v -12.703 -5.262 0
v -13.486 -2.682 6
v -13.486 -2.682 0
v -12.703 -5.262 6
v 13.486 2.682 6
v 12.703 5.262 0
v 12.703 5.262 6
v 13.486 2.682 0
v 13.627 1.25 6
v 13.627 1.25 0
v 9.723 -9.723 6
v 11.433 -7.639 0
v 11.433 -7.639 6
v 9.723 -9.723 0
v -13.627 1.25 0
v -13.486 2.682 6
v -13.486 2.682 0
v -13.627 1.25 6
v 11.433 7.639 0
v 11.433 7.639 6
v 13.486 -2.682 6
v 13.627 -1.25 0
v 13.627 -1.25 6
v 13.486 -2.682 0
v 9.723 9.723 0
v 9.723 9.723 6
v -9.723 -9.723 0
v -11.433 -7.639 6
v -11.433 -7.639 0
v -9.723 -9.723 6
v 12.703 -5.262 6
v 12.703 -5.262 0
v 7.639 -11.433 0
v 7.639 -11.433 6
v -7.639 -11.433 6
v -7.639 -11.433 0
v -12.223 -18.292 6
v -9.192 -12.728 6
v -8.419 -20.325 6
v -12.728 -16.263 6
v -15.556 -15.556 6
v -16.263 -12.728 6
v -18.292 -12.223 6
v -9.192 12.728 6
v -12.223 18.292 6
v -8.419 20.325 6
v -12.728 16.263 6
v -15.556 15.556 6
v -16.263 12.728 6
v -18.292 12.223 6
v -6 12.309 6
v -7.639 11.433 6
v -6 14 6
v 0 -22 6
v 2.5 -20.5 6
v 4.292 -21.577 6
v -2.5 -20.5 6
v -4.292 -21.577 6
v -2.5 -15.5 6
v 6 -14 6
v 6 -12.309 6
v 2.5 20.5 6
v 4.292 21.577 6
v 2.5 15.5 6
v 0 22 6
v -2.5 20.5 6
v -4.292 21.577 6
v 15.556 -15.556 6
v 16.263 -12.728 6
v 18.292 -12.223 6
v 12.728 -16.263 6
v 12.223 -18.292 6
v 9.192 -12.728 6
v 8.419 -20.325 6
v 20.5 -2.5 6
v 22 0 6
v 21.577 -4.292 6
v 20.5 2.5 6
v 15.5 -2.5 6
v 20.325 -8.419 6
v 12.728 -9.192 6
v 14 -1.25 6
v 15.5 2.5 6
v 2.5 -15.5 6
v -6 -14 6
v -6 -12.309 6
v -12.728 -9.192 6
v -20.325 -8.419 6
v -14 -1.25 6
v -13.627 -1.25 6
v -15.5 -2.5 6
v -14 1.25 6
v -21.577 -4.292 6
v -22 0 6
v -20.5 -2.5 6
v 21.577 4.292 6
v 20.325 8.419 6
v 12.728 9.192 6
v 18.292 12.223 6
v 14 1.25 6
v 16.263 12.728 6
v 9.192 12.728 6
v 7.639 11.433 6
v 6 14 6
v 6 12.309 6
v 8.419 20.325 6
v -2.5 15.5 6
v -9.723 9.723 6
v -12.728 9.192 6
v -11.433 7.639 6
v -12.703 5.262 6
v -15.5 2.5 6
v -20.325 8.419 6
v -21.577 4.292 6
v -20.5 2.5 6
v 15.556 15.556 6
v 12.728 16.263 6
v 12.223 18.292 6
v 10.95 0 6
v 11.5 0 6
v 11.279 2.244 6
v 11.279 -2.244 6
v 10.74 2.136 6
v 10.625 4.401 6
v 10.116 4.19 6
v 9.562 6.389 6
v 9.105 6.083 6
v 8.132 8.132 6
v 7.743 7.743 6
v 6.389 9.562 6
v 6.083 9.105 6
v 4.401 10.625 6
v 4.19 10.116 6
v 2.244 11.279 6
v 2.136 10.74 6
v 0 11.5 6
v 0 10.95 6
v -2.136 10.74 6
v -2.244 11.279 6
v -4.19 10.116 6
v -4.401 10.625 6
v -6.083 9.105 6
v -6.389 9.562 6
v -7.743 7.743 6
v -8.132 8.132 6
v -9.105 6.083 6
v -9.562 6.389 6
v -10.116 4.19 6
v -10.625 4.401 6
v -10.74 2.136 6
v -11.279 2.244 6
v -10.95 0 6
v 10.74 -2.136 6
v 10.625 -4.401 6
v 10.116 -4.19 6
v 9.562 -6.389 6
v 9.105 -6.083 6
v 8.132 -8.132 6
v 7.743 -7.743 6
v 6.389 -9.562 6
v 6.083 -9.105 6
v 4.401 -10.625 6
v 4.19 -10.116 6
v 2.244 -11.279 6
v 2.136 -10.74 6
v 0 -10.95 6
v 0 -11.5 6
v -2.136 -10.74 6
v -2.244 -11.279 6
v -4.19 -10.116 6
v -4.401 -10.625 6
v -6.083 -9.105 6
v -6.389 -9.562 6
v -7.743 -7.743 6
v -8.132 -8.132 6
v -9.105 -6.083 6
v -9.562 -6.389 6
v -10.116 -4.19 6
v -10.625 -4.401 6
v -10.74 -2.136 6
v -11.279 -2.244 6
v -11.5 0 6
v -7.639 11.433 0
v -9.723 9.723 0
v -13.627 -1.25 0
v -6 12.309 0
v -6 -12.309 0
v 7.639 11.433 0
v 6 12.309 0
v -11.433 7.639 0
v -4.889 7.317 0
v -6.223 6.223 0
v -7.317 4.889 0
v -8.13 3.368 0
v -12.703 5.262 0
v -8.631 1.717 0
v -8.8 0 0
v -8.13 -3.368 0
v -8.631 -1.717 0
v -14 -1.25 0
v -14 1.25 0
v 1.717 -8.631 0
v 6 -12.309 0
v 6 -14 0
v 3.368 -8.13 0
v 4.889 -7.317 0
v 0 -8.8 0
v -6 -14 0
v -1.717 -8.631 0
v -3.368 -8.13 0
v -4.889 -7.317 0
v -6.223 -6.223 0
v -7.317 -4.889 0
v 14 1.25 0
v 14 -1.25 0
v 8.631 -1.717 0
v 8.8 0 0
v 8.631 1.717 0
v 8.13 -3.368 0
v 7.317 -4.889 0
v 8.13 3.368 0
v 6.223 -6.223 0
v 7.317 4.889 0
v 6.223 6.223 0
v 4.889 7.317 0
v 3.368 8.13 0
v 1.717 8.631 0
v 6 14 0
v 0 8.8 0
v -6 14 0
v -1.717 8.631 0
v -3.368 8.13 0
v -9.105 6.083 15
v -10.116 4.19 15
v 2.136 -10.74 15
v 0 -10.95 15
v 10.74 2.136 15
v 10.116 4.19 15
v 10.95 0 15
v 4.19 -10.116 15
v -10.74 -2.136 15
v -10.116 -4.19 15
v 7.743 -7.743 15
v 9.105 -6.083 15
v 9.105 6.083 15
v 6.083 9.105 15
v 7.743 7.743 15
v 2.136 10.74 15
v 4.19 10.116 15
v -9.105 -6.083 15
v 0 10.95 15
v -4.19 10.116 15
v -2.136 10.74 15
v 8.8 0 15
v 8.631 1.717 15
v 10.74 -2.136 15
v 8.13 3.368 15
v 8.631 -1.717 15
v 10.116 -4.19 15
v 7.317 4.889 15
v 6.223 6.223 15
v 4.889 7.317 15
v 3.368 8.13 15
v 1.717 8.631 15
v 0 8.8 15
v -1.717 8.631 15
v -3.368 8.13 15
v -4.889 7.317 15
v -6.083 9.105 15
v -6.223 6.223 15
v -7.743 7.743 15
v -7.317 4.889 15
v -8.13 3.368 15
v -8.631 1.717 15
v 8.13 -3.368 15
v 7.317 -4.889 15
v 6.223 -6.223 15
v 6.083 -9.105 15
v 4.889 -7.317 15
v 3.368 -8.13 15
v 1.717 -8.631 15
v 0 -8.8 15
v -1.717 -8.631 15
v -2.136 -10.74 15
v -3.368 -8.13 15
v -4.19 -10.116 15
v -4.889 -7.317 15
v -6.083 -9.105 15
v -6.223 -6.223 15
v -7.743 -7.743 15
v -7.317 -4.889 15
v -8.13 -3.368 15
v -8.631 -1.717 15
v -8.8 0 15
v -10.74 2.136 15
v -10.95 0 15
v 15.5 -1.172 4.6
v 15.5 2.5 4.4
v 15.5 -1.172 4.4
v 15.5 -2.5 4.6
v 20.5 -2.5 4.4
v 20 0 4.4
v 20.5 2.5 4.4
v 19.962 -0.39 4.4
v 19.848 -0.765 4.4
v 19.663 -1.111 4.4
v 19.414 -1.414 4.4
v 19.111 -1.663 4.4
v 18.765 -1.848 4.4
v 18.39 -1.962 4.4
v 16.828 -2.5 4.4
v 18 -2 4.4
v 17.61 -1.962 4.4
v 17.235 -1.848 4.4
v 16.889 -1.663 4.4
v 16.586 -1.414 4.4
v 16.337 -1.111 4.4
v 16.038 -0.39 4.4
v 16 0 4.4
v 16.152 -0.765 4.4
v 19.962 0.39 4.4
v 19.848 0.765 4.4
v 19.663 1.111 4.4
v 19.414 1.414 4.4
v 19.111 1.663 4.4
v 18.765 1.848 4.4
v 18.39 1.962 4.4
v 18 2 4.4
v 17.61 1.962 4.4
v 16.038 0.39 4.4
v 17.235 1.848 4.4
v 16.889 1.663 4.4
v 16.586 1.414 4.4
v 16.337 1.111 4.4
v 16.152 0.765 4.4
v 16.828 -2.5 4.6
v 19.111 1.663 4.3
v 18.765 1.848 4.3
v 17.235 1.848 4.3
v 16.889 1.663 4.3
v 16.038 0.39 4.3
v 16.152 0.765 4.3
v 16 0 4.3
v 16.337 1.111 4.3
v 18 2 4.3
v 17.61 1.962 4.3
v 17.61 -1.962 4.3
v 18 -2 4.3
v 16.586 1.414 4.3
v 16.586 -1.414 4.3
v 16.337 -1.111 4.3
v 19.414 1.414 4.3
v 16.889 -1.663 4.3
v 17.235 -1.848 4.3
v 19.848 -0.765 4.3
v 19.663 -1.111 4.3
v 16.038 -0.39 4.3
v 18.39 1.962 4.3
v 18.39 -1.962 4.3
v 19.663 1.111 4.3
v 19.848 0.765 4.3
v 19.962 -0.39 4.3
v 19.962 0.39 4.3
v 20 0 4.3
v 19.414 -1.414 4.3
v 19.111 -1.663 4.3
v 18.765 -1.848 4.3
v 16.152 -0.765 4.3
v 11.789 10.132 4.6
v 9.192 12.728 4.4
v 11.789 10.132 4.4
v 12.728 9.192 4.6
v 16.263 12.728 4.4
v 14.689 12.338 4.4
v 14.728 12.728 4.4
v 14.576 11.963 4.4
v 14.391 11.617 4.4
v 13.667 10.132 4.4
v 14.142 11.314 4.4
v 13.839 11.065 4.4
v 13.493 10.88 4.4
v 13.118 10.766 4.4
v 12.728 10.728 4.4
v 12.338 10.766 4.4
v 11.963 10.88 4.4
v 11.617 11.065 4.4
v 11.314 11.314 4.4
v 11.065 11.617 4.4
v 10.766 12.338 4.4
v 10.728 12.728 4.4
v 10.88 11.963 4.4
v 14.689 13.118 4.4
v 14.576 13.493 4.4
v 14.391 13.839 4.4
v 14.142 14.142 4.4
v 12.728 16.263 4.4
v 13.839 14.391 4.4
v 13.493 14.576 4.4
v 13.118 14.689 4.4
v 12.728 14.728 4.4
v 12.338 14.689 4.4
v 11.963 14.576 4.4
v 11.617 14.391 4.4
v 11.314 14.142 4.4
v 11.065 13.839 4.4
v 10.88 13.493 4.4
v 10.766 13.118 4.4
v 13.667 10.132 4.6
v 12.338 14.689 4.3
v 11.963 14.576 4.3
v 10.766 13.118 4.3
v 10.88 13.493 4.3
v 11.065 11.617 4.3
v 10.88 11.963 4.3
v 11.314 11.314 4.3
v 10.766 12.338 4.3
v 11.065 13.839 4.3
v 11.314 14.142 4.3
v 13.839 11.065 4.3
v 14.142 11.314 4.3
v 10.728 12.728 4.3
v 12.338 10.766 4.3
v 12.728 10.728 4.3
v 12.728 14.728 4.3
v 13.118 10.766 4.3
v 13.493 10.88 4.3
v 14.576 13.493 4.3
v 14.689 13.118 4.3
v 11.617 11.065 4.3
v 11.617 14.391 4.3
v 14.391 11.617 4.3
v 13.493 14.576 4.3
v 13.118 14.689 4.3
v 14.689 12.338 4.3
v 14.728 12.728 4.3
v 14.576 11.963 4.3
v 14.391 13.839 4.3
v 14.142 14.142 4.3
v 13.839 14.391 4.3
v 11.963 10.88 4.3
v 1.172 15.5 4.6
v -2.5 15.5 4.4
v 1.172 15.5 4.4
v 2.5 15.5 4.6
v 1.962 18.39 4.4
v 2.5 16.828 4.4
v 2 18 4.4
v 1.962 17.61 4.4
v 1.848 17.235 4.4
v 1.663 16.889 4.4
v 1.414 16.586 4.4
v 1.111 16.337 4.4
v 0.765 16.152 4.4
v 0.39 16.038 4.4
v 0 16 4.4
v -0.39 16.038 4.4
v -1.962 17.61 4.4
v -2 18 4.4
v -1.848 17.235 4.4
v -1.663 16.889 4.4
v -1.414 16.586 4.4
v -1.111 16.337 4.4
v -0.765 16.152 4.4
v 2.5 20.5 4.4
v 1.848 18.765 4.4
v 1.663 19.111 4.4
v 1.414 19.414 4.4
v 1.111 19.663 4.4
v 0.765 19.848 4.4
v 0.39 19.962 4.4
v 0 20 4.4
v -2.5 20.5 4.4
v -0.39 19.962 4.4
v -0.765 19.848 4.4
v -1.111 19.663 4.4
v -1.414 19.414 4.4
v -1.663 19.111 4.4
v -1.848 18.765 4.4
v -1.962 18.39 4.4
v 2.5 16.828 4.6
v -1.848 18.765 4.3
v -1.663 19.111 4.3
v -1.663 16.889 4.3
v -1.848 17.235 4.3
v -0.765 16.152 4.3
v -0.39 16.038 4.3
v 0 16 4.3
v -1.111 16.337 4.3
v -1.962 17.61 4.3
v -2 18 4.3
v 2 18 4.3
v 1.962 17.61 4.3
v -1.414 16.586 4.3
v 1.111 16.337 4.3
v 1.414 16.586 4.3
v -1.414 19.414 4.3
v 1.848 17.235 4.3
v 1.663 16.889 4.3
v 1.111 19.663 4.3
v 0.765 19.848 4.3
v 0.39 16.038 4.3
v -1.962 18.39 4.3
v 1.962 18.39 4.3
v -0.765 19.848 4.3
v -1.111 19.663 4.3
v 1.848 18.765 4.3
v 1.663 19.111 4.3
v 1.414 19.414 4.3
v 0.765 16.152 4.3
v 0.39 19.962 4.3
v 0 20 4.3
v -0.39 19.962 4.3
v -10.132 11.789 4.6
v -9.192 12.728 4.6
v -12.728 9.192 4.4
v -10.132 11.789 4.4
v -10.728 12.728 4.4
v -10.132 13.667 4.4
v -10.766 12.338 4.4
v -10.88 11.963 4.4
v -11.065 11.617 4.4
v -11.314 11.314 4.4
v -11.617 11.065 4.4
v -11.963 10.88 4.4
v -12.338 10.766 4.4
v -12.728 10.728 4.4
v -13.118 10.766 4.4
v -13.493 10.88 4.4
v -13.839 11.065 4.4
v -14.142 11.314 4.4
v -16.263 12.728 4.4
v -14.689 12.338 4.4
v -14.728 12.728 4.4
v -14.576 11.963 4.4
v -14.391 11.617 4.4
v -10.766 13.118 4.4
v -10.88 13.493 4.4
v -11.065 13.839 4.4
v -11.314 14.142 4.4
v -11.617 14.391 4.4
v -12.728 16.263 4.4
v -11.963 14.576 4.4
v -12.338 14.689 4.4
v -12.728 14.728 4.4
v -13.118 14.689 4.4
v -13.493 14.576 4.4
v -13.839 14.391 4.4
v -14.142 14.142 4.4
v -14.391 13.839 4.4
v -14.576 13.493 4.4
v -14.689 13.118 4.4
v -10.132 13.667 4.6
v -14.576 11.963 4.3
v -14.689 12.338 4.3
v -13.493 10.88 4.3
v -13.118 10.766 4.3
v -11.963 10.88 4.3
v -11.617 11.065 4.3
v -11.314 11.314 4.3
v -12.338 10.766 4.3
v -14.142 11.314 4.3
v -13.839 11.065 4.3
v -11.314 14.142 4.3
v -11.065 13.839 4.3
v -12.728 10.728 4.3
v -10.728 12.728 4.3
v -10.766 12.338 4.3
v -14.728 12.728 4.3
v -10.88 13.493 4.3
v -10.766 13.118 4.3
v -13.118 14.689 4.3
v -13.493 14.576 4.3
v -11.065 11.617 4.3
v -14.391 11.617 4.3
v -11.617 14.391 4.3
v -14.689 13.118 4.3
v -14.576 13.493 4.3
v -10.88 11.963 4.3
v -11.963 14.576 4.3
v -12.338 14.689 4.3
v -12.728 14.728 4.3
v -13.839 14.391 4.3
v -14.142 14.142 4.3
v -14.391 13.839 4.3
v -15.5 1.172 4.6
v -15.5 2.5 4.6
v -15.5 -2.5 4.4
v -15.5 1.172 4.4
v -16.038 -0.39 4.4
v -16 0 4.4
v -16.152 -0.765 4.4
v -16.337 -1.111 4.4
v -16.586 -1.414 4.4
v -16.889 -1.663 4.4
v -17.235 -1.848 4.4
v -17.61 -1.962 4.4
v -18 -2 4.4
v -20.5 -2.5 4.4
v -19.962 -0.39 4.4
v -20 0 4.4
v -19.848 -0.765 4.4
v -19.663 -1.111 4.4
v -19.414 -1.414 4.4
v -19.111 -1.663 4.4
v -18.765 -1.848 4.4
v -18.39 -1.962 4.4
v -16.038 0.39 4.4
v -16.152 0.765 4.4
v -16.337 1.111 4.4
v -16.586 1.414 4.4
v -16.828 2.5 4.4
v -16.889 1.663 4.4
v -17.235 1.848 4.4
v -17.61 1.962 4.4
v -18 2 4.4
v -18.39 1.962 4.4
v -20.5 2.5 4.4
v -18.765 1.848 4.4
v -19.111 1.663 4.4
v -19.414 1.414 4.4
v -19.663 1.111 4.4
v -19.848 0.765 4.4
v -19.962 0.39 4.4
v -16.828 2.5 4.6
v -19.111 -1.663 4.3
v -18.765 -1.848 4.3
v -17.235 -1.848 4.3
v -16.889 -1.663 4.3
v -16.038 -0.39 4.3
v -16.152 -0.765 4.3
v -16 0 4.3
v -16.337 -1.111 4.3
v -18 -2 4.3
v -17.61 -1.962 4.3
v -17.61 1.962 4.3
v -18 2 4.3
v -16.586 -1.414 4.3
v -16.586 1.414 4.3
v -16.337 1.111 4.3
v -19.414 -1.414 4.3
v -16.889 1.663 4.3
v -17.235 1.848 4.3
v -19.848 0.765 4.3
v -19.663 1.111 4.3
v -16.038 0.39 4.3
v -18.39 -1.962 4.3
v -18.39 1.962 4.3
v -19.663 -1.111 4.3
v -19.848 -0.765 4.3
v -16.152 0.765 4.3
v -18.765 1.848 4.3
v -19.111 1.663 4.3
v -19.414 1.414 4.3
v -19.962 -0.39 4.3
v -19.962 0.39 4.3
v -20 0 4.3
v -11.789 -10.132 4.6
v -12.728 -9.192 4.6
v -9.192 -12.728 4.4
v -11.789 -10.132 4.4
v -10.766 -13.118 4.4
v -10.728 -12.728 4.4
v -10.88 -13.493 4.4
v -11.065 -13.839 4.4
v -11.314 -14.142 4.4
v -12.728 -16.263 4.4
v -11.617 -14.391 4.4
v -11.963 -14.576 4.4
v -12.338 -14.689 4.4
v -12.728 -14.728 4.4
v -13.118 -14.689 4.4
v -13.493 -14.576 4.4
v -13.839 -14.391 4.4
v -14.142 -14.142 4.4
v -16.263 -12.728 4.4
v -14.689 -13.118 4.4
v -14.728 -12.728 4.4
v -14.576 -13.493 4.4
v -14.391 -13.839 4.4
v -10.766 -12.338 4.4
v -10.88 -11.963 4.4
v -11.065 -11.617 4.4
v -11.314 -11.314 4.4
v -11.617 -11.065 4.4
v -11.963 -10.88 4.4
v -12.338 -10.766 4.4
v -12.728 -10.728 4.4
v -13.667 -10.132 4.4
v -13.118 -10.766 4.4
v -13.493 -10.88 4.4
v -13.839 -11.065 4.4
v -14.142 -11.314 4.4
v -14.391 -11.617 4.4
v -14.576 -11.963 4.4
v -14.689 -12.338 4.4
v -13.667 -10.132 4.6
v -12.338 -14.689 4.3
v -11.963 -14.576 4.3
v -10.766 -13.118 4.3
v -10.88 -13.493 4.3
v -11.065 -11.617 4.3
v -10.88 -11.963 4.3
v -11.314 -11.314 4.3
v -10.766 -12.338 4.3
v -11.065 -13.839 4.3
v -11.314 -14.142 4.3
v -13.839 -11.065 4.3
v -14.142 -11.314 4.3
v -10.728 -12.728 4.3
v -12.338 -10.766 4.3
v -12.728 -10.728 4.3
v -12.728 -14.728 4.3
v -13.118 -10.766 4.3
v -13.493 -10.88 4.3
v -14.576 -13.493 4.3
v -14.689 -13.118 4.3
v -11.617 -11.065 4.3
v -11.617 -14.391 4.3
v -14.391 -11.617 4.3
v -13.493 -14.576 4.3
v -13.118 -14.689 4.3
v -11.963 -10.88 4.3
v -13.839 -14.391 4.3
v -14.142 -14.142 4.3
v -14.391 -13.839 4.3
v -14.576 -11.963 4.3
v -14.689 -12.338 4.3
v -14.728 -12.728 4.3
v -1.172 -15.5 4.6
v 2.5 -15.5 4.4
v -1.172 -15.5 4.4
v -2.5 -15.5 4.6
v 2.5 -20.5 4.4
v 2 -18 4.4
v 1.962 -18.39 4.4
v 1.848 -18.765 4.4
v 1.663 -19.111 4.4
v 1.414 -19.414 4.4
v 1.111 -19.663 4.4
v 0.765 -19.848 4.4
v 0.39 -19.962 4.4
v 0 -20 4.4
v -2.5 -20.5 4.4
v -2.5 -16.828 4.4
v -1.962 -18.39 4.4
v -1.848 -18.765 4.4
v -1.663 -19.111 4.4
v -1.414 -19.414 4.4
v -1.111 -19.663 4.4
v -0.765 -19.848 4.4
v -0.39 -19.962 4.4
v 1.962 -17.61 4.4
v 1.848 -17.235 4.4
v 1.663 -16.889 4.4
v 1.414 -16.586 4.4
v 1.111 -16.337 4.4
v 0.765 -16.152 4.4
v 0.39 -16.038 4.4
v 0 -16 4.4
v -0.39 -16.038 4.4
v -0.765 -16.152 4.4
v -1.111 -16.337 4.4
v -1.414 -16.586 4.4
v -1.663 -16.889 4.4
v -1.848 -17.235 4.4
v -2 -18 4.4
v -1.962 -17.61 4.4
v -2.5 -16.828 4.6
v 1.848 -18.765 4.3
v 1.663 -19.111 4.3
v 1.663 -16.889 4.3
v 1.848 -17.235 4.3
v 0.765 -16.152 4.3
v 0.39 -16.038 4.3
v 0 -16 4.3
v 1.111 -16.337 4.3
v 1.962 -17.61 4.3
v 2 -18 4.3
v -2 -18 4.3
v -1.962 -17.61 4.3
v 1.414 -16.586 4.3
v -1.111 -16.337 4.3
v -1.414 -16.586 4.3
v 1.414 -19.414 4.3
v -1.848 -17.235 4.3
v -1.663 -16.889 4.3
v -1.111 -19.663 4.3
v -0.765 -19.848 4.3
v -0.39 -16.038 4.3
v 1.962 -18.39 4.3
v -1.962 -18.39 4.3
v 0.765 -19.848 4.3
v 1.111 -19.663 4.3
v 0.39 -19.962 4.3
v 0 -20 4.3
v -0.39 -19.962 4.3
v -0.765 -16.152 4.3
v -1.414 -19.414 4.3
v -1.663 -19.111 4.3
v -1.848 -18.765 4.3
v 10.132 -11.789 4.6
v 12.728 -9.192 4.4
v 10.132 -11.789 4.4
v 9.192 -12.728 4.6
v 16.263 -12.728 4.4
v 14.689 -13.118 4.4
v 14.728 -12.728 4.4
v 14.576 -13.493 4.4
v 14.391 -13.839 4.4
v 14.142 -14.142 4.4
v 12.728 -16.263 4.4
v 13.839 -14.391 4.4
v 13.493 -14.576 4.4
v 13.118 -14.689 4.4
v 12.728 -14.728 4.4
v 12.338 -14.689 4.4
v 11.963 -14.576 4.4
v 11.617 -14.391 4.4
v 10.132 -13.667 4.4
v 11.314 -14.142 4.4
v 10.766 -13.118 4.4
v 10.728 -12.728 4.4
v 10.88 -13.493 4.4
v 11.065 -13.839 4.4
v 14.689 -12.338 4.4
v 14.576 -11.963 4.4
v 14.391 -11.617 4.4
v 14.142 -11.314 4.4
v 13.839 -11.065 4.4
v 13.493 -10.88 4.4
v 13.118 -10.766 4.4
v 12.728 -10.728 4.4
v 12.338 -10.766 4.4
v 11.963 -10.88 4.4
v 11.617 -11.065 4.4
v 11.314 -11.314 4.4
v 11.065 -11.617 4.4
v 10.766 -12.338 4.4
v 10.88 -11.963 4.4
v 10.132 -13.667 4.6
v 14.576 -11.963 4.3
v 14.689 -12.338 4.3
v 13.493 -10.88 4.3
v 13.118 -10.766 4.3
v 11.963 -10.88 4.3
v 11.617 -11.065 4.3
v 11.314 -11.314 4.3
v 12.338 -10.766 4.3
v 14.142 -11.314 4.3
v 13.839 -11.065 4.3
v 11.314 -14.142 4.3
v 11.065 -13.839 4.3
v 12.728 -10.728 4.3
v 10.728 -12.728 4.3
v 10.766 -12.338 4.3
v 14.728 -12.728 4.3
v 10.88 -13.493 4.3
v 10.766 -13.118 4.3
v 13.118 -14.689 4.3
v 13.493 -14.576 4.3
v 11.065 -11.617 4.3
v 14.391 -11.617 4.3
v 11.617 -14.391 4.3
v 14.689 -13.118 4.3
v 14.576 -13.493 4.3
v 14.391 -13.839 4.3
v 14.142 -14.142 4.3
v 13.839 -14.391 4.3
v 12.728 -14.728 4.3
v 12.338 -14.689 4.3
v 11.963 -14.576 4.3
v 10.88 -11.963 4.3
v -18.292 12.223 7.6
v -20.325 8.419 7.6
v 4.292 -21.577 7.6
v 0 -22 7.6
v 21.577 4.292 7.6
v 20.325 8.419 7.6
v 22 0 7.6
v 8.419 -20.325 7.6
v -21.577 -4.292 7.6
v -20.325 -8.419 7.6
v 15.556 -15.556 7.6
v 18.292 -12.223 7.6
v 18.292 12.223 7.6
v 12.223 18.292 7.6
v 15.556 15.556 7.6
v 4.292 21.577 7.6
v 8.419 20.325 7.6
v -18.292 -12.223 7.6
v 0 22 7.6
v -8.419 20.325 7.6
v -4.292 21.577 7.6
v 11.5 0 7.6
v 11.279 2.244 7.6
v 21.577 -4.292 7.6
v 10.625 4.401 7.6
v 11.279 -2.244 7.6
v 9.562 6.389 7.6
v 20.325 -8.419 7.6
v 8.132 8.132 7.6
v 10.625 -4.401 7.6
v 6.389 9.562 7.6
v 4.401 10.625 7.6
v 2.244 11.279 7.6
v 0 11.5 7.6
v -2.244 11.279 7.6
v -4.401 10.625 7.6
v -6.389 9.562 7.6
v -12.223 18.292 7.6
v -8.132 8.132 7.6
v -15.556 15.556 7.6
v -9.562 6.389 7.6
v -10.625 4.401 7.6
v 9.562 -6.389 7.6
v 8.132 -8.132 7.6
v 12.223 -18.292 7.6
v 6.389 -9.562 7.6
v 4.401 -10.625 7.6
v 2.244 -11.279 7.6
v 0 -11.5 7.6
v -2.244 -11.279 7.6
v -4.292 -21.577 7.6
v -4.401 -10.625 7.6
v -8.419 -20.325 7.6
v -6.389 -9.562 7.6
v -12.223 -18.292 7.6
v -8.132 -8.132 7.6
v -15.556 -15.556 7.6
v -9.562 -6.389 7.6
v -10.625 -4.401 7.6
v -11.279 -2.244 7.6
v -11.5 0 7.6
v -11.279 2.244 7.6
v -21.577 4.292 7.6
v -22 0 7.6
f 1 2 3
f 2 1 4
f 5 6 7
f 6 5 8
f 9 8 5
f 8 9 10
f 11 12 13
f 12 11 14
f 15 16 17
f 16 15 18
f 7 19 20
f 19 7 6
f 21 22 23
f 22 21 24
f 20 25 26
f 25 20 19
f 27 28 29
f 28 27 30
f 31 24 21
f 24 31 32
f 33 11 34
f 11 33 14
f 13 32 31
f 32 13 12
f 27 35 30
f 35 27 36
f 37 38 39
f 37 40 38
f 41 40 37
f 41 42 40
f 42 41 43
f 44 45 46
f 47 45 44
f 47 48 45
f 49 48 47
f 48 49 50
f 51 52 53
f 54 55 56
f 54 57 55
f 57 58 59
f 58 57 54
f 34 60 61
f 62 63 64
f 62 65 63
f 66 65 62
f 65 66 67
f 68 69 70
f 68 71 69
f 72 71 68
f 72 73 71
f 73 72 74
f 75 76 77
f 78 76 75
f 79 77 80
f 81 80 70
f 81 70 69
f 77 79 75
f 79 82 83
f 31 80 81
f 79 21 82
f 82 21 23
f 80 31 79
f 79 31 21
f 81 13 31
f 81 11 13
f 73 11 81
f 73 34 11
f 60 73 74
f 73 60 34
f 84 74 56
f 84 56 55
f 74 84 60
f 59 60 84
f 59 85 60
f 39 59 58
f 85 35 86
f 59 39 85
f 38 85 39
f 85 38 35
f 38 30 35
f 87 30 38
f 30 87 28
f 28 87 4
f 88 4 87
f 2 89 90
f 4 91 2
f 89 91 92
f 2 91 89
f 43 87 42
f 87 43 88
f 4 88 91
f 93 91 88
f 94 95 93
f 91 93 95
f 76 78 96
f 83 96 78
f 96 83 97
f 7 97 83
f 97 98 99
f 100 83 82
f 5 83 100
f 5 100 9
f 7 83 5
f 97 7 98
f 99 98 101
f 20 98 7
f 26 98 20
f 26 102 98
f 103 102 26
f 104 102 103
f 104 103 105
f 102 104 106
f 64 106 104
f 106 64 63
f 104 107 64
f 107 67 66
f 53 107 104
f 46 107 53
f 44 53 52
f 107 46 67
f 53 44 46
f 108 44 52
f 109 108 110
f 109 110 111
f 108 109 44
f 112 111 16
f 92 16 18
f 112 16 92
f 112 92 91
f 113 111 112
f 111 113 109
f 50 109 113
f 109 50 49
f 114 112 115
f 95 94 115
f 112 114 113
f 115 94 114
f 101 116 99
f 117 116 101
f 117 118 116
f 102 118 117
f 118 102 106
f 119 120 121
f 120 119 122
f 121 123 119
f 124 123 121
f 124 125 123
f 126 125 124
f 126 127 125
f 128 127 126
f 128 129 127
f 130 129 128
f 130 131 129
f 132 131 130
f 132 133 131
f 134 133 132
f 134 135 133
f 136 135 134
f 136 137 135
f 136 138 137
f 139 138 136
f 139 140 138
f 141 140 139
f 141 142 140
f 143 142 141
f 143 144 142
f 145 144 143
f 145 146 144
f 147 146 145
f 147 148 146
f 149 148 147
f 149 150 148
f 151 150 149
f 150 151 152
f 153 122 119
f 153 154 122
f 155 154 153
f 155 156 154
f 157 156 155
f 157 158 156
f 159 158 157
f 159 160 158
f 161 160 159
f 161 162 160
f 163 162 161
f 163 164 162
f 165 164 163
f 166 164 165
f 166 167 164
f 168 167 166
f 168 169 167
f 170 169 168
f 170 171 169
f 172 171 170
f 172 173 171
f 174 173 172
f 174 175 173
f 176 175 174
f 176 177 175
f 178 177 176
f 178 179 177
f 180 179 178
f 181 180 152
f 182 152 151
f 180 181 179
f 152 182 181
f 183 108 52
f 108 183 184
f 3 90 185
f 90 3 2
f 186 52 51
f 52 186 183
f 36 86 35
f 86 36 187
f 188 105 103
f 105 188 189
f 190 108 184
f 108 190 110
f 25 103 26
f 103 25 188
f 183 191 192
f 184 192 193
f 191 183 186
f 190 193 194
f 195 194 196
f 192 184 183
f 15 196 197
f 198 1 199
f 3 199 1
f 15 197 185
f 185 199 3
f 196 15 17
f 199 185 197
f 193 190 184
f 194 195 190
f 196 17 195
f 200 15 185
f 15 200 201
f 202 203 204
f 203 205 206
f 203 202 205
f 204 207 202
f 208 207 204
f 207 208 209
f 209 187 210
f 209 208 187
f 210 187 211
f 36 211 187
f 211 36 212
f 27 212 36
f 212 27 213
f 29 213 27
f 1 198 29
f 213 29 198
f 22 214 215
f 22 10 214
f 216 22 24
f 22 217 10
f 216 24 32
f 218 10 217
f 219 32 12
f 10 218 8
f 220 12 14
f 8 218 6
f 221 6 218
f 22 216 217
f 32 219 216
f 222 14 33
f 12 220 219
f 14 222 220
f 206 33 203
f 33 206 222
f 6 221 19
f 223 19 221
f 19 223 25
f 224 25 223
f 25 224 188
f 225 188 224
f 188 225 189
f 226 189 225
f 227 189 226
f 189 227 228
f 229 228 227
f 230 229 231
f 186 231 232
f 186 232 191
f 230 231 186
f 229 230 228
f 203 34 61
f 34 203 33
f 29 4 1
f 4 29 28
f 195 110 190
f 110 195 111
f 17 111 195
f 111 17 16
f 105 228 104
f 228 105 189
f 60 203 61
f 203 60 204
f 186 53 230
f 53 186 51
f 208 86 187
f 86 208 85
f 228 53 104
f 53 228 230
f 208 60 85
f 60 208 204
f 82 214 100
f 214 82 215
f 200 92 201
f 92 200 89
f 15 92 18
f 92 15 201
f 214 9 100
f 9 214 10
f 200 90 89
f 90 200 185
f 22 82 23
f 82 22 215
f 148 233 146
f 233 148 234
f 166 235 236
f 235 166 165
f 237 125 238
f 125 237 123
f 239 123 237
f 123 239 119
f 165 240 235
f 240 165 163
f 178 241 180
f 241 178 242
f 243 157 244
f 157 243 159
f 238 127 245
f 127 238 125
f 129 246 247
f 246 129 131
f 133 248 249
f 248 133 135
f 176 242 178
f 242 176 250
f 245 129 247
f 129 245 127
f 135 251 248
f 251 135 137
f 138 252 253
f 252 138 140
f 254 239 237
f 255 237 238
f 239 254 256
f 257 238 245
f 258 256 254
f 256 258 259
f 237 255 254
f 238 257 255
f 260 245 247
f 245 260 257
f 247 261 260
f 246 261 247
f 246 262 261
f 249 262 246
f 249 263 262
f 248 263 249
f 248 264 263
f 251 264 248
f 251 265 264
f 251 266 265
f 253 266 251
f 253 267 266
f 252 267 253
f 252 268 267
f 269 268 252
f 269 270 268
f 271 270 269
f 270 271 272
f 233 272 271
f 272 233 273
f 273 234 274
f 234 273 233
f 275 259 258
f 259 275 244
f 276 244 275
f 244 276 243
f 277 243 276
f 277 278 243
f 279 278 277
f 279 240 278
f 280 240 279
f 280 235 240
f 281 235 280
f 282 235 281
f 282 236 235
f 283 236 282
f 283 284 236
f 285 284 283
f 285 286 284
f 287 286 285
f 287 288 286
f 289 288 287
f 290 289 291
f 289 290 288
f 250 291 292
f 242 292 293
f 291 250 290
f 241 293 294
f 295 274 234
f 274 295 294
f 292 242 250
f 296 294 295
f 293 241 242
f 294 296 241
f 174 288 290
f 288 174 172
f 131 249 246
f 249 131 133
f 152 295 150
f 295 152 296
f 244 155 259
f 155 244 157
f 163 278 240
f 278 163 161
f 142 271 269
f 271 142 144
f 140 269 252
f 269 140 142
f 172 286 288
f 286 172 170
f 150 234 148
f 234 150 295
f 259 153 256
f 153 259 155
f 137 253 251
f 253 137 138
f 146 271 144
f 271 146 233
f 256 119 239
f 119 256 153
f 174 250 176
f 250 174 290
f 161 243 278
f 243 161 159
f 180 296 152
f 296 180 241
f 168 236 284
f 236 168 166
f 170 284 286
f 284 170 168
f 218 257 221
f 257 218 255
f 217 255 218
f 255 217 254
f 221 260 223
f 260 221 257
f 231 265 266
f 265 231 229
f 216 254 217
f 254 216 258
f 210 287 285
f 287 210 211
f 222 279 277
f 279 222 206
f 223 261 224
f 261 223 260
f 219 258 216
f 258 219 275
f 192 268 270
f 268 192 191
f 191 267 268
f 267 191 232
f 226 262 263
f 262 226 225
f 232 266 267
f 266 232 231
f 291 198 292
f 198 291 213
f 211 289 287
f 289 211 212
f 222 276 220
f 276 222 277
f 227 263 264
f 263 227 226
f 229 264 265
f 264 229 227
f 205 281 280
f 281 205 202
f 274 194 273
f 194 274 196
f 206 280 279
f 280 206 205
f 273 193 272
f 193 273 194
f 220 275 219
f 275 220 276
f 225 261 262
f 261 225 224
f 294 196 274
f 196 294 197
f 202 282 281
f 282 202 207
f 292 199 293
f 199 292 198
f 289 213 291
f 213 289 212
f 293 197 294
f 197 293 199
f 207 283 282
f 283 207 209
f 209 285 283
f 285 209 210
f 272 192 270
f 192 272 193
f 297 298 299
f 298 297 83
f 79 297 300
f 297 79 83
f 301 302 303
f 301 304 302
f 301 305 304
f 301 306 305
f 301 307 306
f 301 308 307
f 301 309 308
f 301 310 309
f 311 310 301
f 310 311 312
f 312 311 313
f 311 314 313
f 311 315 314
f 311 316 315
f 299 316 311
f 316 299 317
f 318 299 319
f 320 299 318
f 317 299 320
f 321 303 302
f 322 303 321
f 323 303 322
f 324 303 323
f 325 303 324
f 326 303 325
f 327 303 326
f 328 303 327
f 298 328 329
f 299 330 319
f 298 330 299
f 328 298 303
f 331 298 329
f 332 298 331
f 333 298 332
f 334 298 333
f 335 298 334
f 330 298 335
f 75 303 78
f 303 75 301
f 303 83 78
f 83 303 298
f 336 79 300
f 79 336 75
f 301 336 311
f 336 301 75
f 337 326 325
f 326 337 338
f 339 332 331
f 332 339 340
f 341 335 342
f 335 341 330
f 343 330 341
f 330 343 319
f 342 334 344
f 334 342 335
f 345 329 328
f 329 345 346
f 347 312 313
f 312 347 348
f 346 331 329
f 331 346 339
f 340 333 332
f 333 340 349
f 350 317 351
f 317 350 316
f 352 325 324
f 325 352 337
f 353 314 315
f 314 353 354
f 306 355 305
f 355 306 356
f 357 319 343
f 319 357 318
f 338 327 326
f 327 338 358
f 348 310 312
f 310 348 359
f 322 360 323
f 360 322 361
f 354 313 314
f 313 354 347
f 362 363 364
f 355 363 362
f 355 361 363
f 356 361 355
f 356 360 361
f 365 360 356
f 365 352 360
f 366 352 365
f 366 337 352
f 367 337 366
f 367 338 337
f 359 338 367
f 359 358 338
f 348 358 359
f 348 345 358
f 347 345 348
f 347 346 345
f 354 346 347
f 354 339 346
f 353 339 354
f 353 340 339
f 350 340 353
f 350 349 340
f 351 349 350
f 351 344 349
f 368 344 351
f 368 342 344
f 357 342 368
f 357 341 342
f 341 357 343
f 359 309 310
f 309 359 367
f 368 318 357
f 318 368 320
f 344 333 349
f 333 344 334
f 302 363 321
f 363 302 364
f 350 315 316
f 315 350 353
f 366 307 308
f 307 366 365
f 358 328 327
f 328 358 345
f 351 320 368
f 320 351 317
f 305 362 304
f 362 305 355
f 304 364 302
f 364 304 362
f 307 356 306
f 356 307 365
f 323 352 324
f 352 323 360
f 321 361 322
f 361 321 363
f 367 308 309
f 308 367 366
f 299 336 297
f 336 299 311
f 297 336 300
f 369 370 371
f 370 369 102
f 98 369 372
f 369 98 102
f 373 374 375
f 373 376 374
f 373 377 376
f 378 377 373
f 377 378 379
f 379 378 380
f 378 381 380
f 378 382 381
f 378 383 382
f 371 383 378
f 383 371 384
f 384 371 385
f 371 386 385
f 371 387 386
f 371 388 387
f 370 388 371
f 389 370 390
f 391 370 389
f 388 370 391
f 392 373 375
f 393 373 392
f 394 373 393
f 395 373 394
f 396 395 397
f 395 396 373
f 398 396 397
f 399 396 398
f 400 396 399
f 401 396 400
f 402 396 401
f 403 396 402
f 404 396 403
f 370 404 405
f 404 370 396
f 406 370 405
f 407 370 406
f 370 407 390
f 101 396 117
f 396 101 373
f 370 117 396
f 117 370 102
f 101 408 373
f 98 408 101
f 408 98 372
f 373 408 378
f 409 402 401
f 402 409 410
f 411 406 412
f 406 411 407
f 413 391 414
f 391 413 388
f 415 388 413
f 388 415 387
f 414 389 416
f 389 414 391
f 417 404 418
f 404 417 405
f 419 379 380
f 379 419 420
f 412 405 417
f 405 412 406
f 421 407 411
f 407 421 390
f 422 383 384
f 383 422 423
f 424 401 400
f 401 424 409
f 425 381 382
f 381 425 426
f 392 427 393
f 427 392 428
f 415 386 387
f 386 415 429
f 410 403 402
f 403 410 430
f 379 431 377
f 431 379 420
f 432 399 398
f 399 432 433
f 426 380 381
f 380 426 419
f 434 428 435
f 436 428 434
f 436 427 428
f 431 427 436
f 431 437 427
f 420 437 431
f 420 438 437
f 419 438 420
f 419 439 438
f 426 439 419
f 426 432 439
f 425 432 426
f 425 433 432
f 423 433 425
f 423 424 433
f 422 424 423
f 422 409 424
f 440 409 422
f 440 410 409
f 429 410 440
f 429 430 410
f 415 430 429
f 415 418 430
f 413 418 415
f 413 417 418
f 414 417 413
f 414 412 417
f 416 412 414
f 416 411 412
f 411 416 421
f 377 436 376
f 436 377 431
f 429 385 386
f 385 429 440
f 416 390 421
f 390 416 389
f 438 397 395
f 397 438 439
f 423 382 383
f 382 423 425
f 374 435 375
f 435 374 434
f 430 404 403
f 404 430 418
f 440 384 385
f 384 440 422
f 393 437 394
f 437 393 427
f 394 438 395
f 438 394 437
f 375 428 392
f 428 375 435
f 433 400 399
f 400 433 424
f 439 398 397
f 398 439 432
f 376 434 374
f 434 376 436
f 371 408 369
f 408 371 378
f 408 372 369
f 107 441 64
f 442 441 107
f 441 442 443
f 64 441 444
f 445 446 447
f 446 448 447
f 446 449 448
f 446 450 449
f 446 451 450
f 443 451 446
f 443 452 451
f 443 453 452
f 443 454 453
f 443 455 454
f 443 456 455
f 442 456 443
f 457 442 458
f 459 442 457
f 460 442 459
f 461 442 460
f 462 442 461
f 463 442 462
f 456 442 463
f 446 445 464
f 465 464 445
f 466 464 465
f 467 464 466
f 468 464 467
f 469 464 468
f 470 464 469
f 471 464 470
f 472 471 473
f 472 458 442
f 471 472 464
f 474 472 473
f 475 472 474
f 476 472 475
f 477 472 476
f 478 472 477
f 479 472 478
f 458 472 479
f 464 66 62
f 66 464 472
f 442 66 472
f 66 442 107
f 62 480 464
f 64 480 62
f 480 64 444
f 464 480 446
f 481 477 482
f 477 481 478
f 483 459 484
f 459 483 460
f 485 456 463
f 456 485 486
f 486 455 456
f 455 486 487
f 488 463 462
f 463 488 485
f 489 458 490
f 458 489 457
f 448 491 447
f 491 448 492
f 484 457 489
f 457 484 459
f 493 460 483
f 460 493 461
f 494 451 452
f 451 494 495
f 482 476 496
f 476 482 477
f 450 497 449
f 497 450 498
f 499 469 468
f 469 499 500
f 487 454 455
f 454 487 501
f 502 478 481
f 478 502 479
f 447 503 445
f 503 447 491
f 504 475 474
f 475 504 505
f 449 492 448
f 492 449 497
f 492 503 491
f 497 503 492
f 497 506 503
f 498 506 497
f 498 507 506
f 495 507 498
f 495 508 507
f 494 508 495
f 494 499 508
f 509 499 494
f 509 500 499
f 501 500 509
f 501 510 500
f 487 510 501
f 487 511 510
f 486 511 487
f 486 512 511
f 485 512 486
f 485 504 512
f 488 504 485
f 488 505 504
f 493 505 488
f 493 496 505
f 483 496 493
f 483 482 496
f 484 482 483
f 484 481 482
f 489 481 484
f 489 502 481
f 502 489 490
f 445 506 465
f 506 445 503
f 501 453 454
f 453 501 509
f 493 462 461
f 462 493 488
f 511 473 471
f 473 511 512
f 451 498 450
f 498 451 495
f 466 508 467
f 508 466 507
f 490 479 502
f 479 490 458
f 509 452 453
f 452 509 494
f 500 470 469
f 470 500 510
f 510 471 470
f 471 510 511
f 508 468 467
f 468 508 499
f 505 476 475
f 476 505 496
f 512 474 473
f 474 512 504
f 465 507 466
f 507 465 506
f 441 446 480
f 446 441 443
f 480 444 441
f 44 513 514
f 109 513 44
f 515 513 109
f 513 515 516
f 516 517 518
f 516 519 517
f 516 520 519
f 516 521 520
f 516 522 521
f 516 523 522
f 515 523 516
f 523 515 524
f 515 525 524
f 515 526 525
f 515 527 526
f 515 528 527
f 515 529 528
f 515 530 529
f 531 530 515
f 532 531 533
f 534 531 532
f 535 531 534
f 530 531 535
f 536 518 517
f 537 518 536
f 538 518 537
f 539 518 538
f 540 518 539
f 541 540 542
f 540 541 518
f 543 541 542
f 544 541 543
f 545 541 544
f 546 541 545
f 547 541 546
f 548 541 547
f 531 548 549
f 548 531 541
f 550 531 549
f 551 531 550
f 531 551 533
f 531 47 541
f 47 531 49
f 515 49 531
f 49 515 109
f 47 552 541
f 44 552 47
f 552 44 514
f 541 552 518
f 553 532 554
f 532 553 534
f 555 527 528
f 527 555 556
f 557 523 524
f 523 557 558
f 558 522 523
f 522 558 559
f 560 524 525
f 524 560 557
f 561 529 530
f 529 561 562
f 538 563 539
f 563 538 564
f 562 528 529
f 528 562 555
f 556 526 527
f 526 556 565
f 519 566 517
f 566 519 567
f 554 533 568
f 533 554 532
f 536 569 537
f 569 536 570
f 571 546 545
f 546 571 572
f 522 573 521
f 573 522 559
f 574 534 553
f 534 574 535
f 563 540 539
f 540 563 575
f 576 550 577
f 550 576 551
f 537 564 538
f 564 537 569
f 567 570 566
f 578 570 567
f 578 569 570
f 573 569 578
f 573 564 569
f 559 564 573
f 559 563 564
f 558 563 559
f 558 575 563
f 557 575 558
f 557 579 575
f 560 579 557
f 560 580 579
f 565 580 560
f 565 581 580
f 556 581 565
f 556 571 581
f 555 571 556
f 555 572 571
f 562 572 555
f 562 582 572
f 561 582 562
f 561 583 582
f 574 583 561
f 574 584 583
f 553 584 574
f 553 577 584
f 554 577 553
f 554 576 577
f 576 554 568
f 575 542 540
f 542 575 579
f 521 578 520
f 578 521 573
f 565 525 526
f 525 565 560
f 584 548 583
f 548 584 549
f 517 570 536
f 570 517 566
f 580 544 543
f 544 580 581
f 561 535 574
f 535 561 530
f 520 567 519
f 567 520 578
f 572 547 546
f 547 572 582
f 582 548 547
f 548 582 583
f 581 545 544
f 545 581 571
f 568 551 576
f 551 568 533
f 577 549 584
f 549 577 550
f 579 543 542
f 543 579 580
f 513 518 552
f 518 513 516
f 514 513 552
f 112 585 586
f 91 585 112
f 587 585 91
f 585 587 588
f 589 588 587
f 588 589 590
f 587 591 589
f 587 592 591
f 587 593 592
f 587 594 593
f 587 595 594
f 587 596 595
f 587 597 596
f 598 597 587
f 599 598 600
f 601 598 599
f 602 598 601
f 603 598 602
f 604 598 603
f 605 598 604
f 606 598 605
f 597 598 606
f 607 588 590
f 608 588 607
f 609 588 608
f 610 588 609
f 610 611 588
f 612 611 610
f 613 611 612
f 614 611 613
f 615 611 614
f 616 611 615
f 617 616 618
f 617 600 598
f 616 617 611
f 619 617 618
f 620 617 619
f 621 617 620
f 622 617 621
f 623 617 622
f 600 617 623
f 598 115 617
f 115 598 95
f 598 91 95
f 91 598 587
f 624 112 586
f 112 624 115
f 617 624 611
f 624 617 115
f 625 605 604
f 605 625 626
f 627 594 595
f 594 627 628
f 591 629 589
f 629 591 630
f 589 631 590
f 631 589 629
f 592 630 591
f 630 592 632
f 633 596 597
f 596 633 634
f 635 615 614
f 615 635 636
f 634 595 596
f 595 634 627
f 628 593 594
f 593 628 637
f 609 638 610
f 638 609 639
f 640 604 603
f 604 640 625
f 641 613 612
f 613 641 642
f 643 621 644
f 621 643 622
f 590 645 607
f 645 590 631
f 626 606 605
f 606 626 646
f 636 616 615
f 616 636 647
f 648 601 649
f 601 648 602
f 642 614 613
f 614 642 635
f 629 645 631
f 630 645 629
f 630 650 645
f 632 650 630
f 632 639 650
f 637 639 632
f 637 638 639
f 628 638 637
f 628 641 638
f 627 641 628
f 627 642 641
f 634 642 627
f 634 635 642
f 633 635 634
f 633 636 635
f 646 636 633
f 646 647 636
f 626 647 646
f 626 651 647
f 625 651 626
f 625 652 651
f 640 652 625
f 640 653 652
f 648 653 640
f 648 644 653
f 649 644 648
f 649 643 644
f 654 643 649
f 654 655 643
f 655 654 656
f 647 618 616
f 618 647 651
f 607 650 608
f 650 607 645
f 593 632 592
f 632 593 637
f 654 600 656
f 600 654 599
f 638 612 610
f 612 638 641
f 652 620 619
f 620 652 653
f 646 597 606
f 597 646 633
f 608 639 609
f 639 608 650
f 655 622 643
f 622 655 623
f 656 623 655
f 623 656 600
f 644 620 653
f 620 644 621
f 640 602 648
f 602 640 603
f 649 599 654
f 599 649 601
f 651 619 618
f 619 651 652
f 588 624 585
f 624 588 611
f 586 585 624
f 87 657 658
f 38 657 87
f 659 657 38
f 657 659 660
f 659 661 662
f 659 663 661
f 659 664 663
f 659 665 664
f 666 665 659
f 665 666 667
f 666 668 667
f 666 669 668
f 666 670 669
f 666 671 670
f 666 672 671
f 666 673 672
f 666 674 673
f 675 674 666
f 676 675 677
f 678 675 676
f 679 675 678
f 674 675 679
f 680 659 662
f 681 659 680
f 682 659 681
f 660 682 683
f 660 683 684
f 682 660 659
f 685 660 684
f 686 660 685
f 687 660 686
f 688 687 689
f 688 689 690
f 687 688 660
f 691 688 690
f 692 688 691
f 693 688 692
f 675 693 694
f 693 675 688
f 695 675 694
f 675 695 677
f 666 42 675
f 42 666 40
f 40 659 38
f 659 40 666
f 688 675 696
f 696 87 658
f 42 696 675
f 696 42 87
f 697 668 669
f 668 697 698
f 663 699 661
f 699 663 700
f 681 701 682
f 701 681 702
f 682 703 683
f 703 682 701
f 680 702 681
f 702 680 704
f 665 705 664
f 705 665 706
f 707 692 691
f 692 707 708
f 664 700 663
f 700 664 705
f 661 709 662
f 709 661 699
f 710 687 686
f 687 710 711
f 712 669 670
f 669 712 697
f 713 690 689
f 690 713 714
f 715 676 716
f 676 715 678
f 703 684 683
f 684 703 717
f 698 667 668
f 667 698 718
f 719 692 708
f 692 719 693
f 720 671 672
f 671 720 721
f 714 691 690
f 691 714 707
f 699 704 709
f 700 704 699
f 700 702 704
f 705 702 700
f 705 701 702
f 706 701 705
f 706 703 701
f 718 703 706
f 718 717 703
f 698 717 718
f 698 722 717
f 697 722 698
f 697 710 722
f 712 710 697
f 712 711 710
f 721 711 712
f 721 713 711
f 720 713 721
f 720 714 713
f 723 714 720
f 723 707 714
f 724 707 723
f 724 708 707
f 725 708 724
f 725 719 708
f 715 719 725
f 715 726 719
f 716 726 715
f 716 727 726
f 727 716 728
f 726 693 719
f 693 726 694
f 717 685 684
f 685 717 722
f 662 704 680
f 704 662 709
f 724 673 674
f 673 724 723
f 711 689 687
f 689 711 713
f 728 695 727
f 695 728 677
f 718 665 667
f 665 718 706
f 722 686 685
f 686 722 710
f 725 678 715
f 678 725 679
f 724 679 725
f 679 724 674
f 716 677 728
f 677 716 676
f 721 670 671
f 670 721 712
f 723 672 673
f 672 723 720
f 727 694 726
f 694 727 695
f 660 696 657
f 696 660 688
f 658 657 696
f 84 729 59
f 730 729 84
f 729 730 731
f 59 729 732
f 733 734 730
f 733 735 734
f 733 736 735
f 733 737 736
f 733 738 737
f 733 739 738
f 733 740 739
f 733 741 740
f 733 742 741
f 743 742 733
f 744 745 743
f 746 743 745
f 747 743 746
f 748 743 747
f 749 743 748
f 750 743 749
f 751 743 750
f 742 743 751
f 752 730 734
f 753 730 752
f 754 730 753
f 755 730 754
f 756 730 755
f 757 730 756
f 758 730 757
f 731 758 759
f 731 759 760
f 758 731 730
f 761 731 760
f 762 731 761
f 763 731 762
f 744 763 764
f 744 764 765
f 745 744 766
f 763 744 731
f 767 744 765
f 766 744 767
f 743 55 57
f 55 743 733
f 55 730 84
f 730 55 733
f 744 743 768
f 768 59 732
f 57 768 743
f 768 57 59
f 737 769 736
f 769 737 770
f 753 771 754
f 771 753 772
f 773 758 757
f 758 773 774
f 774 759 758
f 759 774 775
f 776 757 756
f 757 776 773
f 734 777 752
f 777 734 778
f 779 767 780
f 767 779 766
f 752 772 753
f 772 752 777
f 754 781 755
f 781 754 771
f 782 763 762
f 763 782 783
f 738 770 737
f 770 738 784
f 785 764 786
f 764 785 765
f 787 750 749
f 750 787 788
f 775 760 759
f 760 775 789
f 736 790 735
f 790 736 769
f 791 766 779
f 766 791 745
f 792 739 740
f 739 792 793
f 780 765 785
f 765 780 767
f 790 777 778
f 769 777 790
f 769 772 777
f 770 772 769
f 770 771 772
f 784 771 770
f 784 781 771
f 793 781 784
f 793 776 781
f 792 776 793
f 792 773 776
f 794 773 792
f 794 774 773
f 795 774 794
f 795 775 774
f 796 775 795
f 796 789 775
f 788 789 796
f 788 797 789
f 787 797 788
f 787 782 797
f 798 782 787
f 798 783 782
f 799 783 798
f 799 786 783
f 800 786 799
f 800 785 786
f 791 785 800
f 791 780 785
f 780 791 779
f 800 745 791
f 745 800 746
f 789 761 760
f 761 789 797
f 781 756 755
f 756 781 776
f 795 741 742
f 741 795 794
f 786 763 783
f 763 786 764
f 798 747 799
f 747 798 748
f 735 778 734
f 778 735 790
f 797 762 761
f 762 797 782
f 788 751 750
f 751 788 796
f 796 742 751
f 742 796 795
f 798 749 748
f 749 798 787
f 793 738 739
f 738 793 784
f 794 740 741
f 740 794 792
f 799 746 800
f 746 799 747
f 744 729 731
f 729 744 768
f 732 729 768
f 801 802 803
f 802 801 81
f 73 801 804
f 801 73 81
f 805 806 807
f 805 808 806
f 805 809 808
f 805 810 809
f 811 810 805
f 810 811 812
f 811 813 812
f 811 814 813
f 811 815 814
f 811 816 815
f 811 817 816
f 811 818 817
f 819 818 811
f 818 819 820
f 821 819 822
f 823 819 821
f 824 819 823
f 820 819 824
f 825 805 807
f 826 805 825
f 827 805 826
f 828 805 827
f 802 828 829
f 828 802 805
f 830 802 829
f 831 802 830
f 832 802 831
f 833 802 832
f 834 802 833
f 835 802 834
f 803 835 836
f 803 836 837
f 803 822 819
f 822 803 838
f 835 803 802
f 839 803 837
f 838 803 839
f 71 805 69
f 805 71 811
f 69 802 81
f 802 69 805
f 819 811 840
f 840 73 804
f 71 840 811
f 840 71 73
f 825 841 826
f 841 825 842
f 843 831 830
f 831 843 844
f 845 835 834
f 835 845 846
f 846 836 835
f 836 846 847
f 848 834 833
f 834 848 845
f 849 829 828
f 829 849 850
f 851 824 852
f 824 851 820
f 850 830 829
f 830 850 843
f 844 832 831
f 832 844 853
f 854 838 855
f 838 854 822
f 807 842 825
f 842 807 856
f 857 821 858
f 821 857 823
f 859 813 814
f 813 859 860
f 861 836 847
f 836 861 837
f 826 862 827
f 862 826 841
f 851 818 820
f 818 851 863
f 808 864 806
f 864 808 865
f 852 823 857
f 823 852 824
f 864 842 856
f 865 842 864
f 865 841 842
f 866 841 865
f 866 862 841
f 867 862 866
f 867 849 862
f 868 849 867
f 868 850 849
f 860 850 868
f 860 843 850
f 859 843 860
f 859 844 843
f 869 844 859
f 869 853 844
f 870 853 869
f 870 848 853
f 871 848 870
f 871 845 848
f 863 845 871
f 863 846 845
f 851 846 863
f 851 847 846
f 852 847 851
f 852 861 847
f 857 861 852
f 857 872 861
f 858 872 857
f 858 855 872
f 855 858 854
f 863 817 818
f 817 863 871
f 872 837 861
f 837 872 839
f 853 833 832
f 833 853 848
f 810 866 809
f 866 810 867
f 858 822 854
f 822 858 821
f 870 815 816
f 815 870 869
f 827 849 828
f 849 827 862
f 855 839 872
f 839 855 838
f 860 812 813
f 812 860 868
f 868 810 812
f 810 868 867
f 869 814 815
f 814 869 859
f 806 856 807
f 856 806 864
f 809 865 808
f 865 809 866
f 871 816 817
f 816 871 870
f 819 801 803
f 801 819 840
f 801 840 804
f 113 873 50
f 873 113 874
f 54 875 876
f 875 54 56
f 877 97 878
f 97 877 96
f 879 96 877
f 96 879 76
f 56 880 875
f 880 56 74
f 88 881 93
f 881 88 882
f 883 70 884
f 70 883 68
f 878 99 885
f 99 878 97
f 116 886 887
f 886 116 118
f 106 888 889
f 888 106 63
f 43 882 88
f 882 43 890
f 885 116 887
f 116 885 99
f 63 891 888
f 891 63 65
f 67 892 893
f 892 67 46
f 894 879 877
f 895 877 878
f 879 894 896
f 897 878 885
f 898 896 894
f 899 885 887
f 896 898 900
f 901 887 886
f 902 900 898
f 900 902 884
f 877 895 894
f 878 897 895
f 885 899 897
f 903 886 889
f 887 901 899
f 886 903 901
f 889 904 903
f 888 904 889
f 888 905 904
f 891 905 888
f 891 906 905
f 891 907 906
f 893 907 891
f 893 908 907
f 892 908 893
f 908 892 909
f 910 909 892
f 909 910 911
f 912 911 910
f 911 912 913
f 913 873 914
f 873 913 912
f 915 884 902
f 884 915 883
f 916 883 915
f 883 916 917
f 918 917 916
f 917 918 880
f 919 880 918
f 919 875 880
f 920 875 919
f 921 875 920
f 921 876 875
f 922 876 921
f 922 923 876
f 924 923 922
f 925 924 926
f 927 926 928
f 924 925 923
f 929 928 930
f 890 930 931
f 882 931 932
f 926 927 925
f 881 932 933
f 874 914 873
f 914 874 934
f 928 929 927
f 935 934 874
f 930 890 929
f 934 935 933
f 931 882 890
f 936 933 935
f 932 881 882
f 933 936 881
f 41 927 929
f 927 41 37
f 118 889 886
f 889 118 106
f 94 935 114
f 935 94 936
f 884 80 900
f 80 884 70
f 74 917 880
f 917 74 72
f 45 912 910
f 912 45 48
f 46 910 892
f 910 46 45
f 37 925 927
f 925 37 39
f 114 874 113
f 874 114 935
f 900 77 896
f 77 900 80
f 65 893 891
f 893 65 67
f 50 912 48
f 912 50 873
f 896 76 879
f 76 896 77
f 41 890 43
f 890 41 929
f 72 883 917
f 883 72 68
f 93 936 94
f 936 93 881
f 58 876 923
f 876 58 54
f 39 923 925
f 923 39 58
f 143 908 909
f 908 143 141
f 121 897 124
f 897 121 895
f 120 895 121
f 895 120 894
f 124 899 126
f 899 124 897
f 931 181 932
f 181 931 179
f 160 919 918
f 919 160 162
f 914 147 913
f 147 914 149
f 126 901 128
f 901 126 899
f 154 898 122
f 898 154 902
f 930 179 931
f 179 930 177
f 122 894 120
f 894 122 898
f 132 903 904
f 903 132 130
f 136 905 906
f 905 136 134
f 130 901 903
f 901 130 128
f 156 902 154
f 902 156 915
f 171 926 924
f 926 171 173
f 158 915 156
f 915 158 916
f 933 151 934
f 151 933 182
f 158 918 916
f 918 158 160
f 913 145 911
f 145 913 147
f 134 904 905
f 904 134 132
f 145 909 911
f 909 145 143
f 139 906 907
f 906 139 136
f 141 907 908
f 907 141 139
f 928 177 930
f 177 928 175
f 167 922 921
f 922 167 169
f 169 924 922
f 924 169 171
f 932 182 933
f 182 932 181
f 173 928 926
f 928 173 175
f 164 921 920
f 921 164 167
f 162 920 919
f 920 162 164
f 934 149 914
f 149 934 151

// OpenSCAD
// file: parts.scad
/**
 * Martin Egli
 * 2023-04-04
 */

module rotaryEVQ_V5B00215B(loc_res = 32) {
    difference() {
        union() {
            color("LightGray")
            translate([0, 0, 0])
            cylinder(d = 21.9, h = 15, $fn = loc_res);
            color("DarkGray") {
                translate([0, 0, 0])
                cylinder(d = 27.5, h = 6, $fn = loc_res);
                translate([-12/2, -28/2, 0])
                cube([12, 28, 6]);
                translate([-28/2, -2.5/2, 0])
                cube([28, 2.5, 6]);
            }
        }        
        translate([0, 0, -1])
        cylinder(d = 17.6, h = 15+2, $fn = loc_res);
    }
}

module oled1_28ZollRound(loc_res = 32) {
    color("White")
    translate([0, 0, 0.1])
    cylinder(d = 32.4, h = 1.5, $fn = loc_res);
    color("DarkGray")
    hull() {
        translate([0, 0, 0])
        cylinder(d = 35.6, h = 1.5, $fn = loc_res);
        translate([-10/2, -38.1/2, 0])
        cube([10, 10, 1.5]);
    }
}

module buttonPTS526SK_SMTR2(loc_res = 32, h1 = 1.5) {
    // button
    color("Gold")
    translate([0, 0, 0])
    cylinder(d = 2, h = h1, $fn = loc_res);
    // leads
    color("Silver") {
        translate([-6.4/2, -3.7/2-0.5/2, 0])
        cube([6.4, 0.5, 0.1]);
        translate([-6.4/2, 3.7/2-0.5/2, 0])
        cube([6.4, 0.5, 0.1]);
    }
    // body
    color("Black")
    hull() {
        translate([-5.2/2, -2.6/2, 0])
        cube([5.2, 2.6, 0.9]);
        translate([-2.6/2, -5.2/2, 0])
        cube([2.6, 5.2, 0.9]);
    }
    color("Silver")
    hull() {
        translate([-5.2/2, -2.6/2, 0.9])
        cube([5.2, 2.6, 0.1]);
        translate([-2.6/2, -5.2/2, 0.9])
        cube([2.6, 5.2, 0.1]);
    }
    // middle part
    color("Silver")
    translate([0, 0, 1])
    cylinder(d1 = 4, d2 = 3.5, h = 0.15, $fn = loc_res);
}

module buttonPTS526SK15SMTR2(loc_res = 32) {
    buttonPTS526SK_SMTR2(loc_res, 1.5);
}

module led0505(loc_res = 32) {
    difference() {
        union() {
            color("White")
            translate([-5/2, -5/2, 0])
            cube([5, 5, 1.6]);
            color("Gray")
            translate([0, 0, 1.5])
            cylinder(d = 4, h = 0.2, $fn = loc_res);
        }
        translate([5/2, -5/2-1.5, 1.6-0.2])
        rotate([0, 0, 45])
        cube([2, 2, 0.3]);
    }
}

module ledWS2812B(loc_res = 32) {
    led0505(loc_res);
}

module ledSK6812(loc_res = 32) {
    led0505(loc_res);
}

//rotaryEVQ_V5B00215B();
//oled1_28ZollRound();
//ledWS2812B();
// main file
/**
 * Martin Egli
 * 2023-04-05
 */

use<parts.scad>

module part1_DisplayCover(loc_res) {
    difference() {
        translate([0, 0, 0])
        cylinder(d = 42, h = 1.8+0.4, $fn = loc_res);
        hull() {
            translate([0, 0, 0])
            cylinder(d = 36, h = 1.8, $fn = loc_res);
            translate([-10.6/2, -40/2, 0])
            cube([10.6, 10, 1.8]);
        }
        translate([0, 0, 0])
        cylinder(d = 35, h = 1.6+1.8+1, $fn = loc_res);
    }
}


module part2_RotaryHandle(loc_res = 32) {
    echo("part2_RotaryHandle(): this will need some rework");
    
    difference() {
        hull() {
            translate([0, 0, 0])
            cylinder(d = 50, h = 13.7-2.5, $fn= 16);
            
            translate([0, 0, 0])
            cylinder(d = 45, h = 13.7, $fn = loc_res);
        }
        translate([0, 0, -1])
        cylinder(d = 22, h = 15, $fn = loc_res);
        translate([0, 0, 15-6])
        cylinder(d = 42.2, h = 10, $fn = loc_res);
        
        translate([0, 0, -1])
        cube(40);
    }
}

module part4_LightRing(loc_res = 32) {
    difference() {
        hull() {
            translate([0, 0, 0])
            cylinder(d = 50-1, h = 0+6, $fn= loc_res);
            translate([0, 0, 0])
            cylinder(d = 50, h = 0+6-0.5, $fn= loc_res);
        }
        translate([0, 0, -1])
        cylinder(d = 44.2, h = 1.6+1+1.6, $fn = loc_res);
        translate([0, 0, -1])
        cylinder(d = 29, h = 1.6+1+6+1, $fn = loc_res);
        // champfer to direct light
        translate([0, 0, 6-2])
        cylinder(d1 = 32, d2 = 32+15, h = 3+1, $fn = loc_res);
        
        translate([-12.6/2, -28.6/2, 0])
        cube([12.6, 28.6, 6]);
        translate([-28.6/2, -(2.5+.6)/2, 0])
        cube([28.6, 2.5+.6, 6]);
    }
}


module pcbR01(loc_res = 32, show = 1) {
    if(show) {
        translate([0, 0, 1.6])
        oled1_28ZollRound();
    }
    difference() {
        color("Green")
        translate([0, 0, 0])
        cylinder(d = 40, h = 1.6, $fn = loc_res);
        
        translate([0, -21, -0.5])
        hull() {
            translate([+10, 0, 0])
            cylinder(d = 3, h = 1.6+1, $fn = 8);
            translate([-10, 0, 0])
            cylinder(d = 3, h = 1.6+1, $fn = 8);
        }
    }
}

module pcbR02(loc_res = 32, show = 1) {
    if(show) {
        rled = 18;
        nbleds = 8;
        translate([0, 0, 0])
        for(n = [0:1:nbleds-1]) {
            translate([rled*cos(360/nbleds*n), rled*sin(360/nbleds*n), 0])
            rotate([0, 180, 360/nbleds*n])
            ledSK6812();
        }
    }
    color("Green")
    difference() {
        translate([0, 0, 0])
        cylinder(d = 44, h = 1.6, $fn = loc_res);
        translate([0, 0, -1])
        cylinder(d = 23, h = 1.6+2, $fn = loc_res);
    }
}



module puttogether() {
    *translate([0, 0, 16+1.6])
    part1_DisplayCover();
    
    *translate([0, 0, 16])
    pcbR01();
    
    *translate([0, 0, 6.1])
    part2_RotaryHandle();
    
    translate([0, 0, 0])
    rotaryEVQ_V5B00215B();
    
    translate([0, 0, 6])
    pcbR02();
    
    // use % for transparency
    // because it will be printed transparent
    *% translate([0, 0, 0])
    part4_LightRing();
}
puttogether();

// test/print parts
*part1_DisplayCover(256);
*part2_RotaryHandle();
*part4_LightRing(256);
